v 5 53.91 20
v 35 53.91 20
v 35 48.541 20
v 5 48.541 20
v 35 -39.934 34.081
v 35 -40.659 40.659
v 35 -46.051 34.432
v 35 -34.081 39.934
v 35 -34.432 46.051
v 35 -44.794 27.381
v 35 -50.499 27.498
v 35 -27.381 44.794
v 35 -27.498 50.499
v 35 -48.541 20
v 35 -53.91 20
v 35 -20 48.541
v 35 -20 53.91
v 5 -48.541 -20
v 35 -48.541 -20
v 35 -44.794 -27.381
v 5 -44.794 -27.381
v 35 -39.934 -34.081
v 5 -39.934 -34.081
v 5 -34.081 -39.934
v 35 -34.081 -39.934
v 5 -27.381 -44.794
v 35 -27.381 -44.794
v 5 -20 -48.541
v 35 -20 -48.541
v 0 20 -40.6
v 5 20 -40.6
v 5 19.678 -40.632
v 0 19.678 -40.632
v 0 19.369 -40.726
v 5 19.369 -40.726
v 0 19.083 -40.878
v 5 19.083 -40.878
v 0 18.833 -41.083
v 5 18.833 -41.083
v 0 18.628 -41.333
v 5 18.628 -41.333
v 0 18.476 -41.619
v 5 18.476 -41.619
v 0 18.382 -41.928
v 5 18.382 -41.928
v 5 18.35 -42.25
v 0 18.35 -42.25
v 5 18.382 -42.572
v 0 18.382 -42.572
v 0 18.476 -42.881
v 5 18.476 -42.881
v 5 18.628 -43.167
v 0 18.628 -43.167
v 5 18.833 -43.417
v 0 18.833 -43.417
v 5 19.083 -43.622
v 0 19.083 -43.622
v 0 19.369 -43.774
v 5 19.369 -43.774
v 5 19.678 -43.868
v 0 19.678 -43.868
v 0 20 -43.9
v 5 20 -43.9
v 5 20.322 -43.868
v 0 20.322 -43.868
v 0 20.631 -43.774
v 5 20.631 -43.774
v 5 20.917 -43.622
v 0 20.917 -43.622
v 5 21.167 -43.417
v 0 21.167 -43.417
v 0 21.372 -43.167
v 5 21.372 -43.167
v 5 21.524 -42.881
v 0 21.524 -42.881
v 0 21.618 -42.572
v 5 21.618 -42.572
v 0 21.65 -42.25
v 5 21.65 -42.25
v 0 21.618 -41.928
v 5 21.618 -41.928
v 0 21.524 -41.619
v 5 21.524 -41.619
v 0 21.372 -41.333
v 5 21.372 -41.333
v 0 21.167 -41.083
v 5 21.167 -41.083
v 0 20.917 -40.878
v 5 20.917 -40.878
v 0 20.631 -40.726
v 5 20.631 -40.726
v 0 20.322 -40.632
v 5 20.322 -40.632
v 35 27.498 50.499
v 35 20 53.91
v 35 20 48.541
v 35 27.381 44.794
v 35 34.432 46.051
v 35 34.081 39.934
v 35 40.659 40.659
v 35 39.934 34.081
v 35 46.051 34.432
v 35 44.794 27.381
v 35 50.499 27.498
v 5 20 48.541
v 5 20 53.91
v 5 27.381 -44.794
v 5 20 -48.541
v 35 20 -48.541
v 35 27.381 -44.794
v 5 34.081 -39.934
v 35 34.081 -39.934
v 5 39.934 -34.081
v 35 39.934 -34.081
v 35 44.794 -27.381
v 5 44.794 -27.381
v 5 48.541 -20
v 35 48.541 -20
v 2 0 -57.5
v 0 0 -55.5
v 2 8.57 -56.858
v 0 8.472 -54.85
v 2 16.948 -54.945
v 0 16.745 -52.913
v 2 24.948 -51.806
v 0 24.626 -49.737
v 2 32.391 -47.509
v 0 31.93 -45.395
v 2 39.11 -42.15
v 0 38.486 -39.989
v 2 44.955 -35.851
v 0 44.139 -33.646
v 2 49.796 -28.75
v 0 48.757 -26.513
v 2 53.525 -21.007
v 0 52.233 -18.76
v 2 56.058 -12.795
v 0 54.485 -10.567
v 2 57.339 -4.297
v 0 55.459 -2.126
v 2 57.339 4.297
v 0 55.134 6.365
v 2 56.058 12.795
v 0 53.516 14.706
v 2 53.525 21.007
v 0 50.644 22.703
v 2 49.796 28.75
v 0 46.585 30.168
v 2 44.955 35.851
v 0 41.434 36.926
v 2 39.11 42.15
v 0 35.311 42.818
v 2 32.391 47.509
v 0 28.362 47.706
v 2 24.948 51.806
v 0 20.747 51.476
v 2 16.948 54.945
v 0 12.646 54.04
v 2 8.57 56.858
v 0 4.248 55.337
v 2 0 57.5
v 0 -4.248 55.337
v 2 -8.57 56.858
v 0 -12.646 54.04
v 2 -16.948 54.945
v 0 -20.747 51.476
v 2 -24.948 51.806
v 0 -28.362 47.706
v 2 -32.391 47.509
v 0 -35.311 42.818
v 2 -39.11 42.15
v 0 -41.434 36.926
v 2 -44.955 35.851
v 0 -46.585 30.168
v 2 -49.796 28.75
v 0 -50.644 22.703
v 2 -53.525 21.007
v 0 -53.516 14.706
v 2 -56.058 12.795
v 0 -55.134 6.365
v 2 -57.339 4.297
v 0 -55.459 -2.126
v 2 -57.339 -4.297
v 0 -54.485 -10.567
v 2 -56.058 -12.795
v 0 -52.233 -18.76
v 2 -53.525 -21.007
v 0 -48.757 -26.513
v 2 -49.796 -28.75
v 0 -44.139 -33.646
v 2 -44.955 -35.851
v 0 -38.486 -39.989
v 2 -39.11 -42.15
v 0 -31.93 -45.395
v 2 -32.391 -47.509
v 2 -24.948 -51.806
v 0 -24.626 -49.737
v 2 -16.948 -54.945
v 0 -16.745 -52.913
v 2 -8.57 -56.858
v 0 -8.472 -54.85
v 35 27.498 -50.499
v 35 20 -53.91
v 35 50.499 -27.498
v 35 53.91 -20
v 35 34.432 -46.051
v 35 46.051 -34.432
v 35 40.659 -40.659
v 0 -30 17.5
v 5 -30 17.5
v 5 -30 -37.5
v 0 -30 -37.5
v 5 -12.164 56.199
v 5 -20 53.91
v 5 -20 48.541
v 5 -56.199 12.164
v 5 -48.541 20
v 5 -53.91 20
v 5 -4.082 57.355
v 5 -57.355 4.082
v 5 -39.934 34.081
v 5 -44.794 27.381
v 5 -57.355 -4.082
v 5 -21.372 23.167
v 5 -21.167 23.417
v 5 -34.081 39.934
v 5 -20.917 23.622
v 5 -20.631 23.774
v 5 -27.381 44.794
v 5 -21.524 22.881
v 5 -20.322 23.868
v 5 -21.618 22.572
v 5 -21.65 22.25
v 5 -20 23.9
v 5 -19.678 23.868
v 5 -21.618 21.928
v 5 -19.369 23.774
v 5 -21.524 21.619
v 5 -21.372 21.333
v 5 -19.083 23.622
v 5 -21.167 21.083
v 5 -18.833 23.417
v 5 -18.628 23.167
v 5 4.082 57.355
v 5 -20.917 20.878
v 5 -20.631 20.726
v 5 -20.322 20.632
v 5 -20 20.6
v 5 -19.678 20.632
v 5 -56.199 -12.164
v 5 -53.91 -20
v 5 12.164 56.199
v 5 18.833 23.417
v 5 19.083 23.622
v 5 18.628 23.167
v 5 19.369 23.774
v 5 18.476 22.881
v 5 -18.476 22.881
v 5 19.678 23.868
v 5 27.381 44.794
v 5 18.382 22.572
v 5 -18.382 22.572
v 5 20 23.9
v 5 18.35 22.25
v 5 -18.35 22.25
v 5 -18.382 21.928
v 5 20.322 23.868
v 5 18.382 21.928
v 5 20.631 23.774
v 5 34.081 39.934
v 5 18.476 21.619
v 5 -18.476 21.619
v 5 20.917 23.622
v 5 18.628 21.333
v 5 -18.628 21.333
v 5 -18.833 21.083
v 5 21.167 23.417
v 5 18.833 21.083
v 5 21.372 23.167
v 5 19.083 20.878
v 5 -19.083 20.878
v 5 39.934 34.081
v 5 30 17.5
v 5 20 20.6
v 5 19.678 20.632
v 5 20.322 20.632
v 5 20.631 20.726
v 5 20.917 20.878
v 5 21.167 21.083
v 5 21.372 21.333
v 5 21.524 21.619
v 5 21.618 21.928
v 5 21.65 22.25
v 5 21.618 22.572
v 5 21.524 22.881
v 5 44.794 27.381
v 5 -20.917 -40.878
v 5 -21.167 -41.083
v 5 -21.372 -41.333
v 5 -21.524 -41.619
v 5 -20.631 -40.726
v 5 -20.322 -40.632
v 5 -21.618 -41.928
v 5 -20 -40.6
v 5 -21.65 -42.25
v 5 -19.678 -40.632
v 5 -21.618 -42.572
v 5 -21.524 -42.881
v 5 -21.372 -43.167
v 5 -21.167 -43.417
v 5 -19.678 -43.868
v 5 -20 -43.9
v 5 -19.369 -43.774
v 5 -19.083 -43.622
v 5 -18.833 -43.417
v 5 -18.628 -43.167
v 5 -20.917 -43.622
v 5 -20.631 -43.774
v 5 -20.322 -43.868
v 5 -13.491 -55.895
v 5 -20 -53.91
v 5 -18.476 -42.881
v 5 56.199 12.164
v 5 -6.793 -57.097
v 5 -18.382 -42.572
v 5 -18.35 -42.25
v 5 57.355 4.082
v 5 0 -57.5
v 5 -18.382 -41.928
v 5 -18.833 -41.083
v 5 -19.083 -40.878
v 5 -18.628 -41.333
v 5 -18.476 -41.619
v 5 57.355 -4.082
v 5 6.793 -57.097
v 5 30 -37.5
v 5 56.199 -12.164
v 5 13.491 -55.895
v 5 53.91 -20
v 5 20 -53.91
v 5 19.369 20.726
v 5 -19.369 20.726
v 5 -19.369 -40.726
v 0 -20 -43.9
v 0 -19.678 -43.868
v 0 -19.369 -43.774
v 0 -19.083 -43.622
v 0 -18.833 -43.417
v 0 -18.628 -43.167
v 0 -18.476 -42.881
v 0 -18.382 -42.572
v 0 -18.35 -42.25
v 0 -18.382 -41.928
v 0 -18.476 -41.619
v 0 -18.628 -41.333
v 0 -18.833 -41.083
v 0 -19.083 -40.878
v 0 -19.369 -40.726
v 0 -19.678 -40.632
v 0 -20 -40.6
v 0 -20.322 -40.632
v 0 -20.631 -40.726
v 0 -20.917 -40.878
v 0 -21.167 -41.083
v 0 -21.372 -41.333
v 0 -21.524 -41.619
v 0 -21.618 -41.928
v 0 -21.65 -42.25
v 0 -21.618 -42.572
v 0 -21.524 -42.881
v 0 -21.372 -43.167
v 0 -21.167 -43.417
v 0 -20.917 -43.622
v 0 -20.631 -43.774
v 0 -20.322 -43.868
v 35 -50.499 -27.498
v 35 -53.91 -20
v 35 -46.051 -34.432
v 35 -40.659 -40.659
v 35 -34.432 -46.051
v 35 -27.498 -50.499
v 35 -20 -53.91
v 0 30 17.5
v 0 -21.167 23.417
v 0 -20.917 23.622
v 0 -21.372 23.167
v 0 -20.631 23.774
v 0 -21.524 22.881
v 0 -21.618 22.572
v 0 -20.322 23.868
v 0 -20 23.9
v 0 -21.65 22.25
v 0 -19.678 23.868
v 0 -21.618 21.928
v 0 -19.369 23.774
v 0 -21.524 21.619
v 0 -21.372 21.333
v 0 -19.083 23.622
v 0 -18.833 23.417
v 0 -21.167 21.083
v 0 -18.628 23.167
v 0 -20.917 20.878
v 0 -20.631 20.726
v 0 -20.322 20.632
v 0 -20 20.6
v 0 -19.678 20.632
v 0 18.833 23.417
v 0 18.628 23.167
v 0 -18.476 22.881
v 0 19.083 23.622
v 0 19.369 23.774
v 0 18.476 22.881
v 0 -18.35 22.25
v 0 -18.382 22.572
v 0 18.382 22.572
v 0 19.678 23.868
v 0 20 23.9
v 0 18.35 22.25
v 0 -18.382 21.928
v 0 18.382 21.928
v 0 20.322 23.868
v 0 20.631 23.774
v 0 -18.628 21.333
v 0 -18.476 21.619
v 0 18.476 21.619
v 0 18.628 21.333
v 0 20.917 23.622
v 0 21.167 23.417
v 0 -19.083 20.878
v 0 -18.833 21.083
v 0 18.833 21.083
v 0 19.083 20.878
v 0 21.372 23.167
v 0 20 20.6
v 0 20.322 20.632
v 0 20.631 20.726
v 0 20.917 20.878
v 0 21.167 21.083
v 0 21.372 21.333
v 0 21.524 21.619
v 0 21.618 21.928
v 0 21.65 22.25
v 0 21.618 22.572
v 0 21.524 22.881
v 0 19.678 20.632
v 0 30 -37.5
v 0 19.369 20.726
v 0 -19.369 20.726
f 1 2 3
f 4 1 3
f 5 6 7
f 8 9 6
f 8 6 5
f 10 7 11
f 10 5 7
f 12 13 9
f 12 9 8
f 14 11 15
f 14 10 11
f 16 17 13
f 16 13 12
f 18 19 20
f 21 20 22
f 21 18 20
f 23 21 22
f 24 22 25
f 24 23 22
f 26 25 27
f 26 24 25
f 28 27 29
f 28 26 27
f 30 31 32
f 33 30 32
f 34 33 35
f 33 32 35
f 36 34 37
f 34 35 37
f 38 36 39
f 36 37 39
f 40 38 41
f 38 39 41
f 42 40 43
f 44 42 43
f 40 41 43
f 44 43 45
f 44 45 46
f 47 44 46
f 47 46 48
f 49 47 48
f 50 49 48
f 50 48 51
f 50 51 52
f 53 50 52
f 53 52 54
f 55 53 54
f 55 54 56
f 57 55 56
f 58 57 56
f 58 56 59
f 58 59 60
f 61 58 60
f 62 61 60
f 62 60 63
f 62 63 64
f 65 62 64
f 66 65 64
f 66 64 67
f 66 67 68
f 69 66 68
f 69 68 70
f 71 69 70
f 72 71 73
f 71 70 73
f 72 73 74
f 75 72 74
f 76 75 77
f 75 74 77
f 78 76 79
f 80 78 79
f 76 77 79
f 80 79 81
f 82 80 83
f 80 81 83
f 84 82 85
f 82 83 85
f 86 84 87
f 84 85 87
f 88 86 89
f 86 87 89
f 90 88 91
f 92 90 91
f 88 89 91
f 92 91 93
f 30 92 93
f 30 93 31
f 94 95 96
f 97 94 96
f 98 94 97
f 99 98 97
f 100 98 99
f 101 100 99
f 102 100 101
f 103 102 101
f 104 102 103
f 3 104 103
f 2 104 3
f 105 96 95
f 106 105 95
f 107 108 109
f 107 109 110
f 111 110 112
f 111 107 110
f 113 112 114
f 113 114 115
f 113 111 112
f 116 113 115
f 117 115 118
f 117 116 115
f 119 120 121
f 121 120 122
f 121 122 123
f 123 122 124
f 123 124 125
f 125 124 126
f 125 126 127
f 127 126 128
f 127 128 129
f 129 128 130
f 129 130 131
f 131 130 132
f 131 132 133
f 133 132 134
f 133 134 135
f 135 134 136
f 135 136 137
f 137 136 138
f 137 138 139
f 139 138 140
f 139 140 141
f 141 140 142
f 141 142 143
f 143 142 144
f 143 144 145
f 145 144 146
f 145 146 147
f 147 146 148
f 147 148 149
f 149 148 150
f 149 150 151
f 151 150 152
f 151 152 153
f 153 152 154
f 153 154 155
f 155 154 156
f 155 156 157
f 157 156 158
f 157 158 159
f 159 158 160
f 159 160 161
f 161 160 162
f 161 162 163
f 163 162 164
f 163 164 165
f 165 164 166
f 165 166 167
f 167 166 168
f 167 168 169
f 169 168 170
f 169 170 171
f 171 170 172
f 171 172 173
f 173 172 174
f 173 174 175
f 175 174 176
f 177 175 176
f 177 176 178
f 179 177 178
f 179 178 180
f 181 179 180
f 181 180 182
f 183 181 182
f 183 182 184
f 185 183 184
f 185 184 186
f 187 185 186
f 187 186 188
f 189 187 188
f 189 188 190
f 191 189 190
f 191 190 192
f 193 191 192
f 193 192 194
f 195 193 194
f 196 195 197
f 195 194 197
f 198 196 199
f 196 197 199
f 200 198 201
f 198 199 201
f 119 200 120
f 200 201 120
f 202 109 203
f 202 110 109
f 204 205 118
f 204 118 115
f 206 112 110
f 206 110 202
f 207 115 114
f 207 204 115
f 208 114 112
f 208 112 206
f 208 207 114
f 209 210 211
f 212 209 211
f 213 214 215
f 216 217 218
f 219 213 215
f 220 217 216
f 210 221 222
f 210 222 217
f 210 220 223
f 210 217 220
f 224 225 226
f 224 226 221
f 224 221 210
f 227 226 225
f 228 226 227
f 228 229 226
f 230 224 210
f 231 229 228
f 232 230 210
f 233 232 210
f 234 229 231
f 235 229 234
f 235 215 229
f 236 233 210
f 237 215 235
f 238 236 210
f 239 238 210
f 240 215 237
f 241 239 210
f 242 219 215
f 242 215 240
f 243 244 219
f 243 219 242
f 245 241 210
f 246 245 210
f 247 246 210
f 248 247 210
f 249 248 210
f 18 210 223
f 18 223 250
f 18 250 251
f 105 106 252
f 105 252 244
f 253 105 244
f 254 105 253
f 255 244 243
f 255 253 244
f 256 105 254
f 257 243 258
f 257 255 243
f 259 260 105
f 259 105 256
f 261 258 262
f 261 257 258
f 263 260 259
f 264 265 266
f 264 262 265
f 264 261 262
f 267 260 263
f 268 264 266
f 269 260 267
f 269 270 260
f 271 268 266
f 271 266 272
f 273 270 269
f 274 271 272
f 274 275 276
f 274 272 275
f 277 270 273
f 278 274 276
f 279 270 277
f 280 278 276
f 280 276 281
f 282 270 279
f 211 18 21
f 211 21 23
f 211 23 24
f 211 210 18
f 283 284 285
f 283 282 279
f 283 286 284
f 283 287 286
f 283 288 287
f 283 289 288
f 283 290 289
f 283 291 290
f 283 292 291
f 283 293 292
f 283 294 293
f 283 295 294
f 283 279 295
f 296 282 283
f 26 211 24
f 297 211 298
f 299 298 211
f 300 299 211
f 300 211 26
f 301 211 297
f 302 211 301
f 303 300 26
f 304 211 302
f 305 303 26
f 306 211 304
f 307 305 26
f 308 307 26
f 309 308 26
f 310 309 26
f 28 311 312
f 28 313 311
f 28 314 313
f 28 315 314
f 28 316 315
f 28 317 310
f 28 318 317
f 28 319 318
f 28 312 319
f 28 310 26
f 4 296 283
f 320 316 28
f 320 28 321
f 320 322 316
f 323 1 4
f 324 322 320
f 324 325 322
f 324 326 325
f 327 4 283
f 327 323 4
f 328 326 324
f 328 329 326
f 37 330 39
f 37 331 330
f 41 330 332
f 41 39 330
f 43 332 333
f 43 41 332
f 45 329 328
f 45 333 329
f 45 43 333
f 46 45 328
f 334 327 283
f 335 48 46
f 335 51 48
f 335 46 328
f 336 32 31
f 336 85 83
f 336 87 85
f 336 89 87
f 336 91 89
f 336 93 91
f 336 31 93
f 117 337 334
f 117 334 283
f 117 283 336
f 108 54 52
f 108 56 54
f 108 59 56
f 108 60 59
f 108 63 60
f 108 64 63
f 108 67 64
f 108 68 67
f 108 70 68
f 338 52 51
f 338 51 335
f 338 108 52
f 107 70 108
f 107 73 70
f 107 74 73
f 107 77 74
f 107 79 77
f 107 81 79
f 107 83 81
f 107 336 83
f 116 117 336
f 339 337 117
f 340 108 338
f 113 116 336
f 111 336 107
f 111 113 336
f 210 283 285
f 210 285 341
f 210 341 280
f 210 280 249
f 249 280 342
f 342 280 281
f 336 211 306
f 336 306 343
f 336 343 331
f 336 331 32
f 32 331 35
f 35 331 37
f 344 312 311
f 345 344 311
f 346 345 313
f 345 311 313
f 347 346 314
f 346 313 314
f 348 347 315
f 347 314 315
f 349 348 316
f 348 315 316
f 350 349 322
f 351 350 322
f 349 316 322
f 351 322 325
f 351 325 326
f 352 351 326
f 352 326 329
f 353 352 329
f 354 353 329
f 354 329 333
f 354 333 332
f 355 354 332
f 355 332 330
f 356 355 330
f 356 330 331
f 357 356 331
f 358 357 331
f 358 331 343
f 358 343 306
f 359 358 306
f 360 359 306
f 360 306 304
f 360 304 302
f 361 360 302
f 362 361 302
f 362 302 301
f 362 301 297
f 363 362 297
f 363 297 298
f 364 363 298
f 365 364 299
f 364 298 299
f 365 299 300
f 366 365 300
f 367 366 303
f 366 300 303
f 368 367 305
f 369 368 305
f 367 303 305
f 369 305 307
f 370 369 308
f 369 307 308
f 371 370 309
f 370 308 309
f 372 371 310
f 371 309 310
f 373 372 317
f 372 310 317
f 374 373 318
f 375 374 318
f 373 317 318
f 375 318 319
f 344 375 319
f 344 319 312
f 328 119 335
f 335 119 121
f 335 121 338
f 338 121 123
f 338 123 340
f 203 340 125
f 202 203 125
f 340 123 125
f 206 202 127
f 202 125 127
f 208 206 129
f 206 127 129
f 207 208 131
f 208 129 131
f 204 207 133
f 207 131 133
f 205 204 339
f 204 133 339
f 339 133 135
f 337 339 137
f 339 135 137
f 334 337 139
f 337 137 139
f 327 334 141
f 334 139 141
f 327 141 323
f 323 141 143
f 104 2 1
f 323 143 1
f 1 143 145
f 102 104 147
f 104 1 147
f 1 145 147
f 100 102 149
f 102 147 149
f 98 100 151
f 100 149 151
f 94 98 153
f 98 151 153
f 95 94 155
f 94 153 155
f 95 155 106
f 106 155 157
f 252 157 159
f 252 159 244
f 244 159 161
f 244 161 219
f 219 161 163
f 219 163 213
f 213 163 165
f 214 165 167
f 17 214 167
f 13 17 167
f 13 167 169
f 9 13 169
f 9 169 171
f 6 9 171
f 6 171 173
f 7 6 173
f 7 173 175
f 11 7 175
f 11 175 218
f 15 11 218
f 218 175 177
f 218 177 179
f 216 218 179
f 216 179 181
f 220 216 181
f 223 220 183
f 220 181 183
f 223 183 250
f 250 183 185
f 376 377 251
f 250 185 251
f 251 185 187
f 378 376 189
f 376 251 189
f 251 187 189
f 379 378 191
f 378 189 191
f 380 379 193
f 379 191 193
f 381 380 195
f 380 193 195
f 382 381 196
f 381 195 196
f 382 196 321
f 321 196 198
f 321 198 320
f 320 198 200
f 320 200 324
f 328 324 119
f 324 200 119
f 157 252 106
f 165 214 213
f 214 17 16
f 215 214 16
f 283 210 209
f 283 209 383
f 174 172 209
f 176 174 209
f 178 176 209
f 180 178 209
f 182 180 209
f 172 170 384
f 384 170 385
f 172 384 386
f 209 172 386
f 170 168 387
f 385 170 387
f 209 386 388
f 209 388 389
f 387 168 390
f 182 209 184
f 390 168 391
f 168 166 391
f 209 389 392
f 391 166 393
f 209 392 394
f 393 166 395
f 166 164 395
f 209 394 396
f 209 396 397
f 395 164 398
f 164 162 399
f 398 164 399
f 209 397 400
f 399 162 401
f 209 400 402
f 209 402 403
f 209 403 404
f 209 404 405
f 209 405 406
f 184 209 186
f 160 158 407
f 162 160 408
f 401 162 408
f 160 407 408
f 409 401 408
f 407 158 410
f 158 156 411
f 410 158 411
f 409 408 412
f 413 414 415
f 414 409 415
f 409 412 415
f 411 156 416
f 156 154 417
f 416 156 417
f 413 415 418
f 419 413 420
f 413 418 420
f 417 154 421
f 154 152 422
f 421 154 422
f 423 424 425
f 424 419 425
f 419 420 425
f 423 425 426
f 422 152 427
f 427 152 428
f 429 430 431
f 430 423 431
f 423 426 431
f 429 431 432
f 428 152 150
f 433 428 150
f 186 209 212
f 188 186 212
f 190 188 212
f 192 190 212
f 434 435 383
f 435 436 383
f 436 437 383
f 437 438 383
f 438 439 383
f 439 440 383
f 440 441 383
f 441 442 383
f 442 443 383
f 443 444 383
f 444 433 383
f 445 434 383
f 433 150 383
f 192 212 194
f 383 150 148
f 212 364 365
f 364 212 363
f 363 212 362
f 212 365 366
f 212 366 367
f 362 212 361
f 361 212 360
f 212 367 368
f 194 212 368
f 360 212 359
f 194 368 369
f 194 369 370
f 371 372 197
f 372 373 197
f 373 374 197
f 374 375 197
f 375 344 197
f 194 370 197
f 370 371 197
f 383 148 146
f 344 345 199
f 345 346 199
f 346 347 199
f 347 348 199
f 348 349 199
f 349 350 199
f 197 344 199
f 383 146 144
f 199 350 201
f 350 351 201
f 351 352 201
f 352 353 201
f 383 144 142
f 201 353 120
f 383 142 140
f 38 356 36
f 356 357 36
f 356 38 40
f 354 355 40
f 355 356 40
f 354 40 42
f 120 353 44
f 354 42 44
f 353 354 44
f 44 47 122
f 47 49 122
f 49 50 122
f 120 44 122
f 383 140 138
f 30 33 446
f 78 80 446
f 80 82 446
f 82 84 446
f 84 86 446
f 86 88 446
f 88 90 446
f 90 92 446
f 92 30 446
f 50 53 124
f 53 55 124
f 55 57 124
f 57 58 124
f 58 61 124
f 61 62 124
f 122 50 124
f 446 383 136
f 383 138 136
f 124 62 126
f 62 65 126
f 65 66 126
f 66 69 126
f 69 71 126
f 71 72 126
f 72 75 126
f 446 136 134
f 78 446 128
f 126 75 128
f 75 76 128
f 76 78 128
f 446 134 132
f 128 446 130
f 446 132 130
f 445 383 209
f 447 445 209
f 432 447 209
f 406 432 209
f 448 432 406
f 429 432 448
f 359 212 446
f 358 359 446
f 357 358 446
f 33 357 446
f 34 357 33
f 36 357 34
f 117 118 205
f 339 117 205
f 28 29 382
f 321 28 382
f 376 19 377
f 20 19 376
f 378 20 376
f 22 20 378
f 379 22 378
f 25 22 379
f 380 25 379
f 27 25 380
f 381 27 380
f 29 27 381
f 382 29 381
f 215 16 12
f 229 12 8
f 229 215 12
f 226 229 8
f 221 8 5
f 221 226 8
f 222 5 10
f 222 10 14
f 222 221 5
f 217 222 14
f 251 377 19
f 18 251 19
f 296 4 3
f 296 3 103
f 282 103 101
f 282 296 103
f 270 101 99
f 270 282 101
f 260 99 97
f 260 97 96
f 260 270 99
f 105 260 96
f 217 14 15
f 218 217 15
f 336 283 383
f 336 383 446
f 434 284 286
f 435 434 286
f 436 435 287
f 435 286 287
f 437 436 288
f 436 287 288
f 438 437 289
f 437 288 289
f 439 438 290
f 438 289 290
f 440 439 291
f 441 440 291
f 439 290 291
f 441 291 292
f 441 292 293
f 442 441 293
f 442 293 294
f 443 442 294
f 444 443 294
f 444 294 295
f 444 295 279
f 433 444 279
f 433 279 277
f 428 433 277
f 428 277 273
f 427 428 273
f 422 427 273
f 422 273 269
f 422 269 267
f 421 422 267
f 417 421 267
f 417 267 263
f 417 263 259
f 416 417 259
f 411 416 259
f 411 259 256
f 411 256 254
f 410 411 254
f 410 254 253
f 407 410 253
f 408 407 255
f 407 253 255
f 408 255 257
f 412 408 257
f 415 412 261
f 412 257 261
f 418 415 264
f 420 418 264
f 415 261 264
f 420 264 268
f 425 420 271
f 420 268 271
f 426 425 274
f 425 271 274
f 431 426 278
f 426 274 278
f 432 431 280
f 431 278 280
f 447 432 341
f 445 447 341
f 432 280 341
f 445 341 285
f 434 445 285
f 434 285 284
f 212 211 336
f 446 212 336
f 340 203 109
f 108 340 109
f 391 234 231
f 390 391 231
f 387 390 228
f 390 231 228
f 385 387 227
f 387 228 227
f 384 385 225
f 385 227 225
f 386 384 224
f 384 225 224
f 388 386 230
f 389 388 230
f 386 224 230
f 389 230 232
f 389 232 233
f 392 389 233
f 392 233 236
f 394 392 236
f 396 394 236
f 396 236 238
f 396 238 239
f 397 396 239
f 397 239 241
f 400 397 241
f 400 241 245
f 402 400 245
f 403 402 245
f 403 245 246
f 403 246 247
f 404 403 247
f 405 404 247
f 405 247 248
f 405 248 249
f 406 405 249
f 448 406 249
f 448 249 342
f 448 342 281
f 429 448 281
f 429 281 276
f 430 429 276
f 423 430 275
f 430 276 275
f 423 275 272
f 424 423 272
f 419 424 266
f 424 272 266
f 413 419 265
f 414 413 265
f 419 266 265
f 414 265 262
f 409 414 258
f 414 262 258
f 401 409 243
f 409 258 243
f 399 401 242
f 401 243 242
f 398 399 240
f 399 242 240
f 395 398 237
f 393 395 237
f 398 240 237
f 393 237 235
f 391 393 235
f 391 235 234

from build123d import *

# Parameters (mm, degrees)
SKETCH_1_R          = 57.5
EXTRUDE_1_DEPTH     = 5
SKETCH_2_R          = 57.5
SKETCH_2_R_2        = 52.5
EXTRUDE_2_DEPTH     = 30
SKETCH_3_R          = 1.65
SKETCH_3_W          = 55
SKETCH_3_H          = 60
CUT_EXTRUDE_1_DEPTH = 87.674679117
CUT_EXTRUDE_START   = -30
CUT_EXTRUDE_2_DEPTH = 30
CHAMFER_1_SIZE      = 2


with BuildPart() as part:
    # ｽｹｯﾁ1 → ﾎﾞｽ - 押し出し1 (new body)
    with BuildSketch(Plane(origin=(0, 0, 0), x_dir=(0, 0, -1), z_dir=(1, 0, 0))):
        Circle(SKETCH_1_R)
    extrude(amount=EXTRUDE_1_DEPTH)

    # ｽｹｯﾁ2 → ﾎﾞｽ - 押し出し2 (add)
    with BuildSketch(Plane(origin=(5, 0, 0), x_dir=(0, 0, -1), z_dir=(1, 0, 0))):
        Circle(SKETCH_2_R)
        Circle(SKETCH_2_R_2, mode=Mode.SUBTRACT)
    extrude(amount=EXTRUDE_2_DEPTH)

    # ｽｹｯﾁ3 → ｶｯﾄ - 押し出し1 (cut, through all)
    with BuildSketch(Plane(origin=(5, 0, 0), x_dir=(0, 0, -1), z_dir=(1, 0, 0))):
        with Locations((-22.25, 20)):
            Circle(SKETCH_3_R)
        with Locations(Location((-22.25, -20, 0), (0, 0, 180))):
            Circle(SKETCH_3_R)
        with Locations(Location((42.25, 20, 0), (0, 0, 180))):
            Circle(SKETCH_3_R)
        with Locations((42.25, -20)):
            Circle(SKETCH_3_R)
        with Locations((10, 0)):
            Rectangle(SKETCH_3_W, SKETCH_3_H)
    extrude(amount=-CUT_EXTRUDE_1_DEPTH, mode=Mode.SUBTRACT)

    # ｽｹｯﾁ4 → ｶｯﾄ - 押し出し2 (cut)
    with BuildSketch(Plane(origin=(35, 0, 0), x_dir=(0, 0, -1), z_dir=(1, 0, 0)).offset(CUT_EXTRUDE_START)):
        with BuildLine():
            ThreePointArc((20, 53.909646632), (0, 57.5), (-20, 53.909646632))
            Line((-20, 53.909646632), (-20, 48.541219597))
            ThreePointArc((-20, 48.541219597), (0, 52.5), (20, 48.541219597))
            Line((20, 48.541219597), (20, 53.909646632))
        make_face()
        with BuildLine():
            Line((-48.541219597, 20), (-53.909646632, 20))
            ThreePointArc((-53.909646632, 20), (-57.5, 0), (-53.909646632, -20))
            Line((-53.909646632, -20), (-48.541219597, -20))
            ThreePointArc((-48.541219597, -20), (-52.5, 0), (-48.541219597, 20))
        make_face()
        with BuildLine():
            Line((53.909646632, 20), (48.541219597, 20))
            ThreePointArc((48.541219597, 20), (52.5, 0), (48.541219597, -20))
            Line((48.541219597, -20), (53.909646632, -20))
            ThreePointArc((53.909646632, -20), (57.5, 0), (53.909646632, 20))
        make_face()
        with BuildLine():
            Line((-20, -48.541219597), (-20, -53.909646632))
            ThreePointArc((-20, -53.909646632), (0, -57.5), (20, -53.909646632))
            Line((20, -53.909646632), (20, -48.541219597))
            ThreePointArc((20, -48.541219597), (0, -52.5), (-20, -48.541219597))
        make_face()
    extrude(amount=CUT_EXTRUDE_2_DEPTH, mode=Mode.SUBTRACT)

    # 面取り1
    chamfer_1_edges = [part.edges().sort_by_distance(p)[0] for p in [
        (0, 0, 57.5),
    ]]
    chamfer(chamfer_1_edges, length=CHAMFER_1_SIZE)


solid = part.part
